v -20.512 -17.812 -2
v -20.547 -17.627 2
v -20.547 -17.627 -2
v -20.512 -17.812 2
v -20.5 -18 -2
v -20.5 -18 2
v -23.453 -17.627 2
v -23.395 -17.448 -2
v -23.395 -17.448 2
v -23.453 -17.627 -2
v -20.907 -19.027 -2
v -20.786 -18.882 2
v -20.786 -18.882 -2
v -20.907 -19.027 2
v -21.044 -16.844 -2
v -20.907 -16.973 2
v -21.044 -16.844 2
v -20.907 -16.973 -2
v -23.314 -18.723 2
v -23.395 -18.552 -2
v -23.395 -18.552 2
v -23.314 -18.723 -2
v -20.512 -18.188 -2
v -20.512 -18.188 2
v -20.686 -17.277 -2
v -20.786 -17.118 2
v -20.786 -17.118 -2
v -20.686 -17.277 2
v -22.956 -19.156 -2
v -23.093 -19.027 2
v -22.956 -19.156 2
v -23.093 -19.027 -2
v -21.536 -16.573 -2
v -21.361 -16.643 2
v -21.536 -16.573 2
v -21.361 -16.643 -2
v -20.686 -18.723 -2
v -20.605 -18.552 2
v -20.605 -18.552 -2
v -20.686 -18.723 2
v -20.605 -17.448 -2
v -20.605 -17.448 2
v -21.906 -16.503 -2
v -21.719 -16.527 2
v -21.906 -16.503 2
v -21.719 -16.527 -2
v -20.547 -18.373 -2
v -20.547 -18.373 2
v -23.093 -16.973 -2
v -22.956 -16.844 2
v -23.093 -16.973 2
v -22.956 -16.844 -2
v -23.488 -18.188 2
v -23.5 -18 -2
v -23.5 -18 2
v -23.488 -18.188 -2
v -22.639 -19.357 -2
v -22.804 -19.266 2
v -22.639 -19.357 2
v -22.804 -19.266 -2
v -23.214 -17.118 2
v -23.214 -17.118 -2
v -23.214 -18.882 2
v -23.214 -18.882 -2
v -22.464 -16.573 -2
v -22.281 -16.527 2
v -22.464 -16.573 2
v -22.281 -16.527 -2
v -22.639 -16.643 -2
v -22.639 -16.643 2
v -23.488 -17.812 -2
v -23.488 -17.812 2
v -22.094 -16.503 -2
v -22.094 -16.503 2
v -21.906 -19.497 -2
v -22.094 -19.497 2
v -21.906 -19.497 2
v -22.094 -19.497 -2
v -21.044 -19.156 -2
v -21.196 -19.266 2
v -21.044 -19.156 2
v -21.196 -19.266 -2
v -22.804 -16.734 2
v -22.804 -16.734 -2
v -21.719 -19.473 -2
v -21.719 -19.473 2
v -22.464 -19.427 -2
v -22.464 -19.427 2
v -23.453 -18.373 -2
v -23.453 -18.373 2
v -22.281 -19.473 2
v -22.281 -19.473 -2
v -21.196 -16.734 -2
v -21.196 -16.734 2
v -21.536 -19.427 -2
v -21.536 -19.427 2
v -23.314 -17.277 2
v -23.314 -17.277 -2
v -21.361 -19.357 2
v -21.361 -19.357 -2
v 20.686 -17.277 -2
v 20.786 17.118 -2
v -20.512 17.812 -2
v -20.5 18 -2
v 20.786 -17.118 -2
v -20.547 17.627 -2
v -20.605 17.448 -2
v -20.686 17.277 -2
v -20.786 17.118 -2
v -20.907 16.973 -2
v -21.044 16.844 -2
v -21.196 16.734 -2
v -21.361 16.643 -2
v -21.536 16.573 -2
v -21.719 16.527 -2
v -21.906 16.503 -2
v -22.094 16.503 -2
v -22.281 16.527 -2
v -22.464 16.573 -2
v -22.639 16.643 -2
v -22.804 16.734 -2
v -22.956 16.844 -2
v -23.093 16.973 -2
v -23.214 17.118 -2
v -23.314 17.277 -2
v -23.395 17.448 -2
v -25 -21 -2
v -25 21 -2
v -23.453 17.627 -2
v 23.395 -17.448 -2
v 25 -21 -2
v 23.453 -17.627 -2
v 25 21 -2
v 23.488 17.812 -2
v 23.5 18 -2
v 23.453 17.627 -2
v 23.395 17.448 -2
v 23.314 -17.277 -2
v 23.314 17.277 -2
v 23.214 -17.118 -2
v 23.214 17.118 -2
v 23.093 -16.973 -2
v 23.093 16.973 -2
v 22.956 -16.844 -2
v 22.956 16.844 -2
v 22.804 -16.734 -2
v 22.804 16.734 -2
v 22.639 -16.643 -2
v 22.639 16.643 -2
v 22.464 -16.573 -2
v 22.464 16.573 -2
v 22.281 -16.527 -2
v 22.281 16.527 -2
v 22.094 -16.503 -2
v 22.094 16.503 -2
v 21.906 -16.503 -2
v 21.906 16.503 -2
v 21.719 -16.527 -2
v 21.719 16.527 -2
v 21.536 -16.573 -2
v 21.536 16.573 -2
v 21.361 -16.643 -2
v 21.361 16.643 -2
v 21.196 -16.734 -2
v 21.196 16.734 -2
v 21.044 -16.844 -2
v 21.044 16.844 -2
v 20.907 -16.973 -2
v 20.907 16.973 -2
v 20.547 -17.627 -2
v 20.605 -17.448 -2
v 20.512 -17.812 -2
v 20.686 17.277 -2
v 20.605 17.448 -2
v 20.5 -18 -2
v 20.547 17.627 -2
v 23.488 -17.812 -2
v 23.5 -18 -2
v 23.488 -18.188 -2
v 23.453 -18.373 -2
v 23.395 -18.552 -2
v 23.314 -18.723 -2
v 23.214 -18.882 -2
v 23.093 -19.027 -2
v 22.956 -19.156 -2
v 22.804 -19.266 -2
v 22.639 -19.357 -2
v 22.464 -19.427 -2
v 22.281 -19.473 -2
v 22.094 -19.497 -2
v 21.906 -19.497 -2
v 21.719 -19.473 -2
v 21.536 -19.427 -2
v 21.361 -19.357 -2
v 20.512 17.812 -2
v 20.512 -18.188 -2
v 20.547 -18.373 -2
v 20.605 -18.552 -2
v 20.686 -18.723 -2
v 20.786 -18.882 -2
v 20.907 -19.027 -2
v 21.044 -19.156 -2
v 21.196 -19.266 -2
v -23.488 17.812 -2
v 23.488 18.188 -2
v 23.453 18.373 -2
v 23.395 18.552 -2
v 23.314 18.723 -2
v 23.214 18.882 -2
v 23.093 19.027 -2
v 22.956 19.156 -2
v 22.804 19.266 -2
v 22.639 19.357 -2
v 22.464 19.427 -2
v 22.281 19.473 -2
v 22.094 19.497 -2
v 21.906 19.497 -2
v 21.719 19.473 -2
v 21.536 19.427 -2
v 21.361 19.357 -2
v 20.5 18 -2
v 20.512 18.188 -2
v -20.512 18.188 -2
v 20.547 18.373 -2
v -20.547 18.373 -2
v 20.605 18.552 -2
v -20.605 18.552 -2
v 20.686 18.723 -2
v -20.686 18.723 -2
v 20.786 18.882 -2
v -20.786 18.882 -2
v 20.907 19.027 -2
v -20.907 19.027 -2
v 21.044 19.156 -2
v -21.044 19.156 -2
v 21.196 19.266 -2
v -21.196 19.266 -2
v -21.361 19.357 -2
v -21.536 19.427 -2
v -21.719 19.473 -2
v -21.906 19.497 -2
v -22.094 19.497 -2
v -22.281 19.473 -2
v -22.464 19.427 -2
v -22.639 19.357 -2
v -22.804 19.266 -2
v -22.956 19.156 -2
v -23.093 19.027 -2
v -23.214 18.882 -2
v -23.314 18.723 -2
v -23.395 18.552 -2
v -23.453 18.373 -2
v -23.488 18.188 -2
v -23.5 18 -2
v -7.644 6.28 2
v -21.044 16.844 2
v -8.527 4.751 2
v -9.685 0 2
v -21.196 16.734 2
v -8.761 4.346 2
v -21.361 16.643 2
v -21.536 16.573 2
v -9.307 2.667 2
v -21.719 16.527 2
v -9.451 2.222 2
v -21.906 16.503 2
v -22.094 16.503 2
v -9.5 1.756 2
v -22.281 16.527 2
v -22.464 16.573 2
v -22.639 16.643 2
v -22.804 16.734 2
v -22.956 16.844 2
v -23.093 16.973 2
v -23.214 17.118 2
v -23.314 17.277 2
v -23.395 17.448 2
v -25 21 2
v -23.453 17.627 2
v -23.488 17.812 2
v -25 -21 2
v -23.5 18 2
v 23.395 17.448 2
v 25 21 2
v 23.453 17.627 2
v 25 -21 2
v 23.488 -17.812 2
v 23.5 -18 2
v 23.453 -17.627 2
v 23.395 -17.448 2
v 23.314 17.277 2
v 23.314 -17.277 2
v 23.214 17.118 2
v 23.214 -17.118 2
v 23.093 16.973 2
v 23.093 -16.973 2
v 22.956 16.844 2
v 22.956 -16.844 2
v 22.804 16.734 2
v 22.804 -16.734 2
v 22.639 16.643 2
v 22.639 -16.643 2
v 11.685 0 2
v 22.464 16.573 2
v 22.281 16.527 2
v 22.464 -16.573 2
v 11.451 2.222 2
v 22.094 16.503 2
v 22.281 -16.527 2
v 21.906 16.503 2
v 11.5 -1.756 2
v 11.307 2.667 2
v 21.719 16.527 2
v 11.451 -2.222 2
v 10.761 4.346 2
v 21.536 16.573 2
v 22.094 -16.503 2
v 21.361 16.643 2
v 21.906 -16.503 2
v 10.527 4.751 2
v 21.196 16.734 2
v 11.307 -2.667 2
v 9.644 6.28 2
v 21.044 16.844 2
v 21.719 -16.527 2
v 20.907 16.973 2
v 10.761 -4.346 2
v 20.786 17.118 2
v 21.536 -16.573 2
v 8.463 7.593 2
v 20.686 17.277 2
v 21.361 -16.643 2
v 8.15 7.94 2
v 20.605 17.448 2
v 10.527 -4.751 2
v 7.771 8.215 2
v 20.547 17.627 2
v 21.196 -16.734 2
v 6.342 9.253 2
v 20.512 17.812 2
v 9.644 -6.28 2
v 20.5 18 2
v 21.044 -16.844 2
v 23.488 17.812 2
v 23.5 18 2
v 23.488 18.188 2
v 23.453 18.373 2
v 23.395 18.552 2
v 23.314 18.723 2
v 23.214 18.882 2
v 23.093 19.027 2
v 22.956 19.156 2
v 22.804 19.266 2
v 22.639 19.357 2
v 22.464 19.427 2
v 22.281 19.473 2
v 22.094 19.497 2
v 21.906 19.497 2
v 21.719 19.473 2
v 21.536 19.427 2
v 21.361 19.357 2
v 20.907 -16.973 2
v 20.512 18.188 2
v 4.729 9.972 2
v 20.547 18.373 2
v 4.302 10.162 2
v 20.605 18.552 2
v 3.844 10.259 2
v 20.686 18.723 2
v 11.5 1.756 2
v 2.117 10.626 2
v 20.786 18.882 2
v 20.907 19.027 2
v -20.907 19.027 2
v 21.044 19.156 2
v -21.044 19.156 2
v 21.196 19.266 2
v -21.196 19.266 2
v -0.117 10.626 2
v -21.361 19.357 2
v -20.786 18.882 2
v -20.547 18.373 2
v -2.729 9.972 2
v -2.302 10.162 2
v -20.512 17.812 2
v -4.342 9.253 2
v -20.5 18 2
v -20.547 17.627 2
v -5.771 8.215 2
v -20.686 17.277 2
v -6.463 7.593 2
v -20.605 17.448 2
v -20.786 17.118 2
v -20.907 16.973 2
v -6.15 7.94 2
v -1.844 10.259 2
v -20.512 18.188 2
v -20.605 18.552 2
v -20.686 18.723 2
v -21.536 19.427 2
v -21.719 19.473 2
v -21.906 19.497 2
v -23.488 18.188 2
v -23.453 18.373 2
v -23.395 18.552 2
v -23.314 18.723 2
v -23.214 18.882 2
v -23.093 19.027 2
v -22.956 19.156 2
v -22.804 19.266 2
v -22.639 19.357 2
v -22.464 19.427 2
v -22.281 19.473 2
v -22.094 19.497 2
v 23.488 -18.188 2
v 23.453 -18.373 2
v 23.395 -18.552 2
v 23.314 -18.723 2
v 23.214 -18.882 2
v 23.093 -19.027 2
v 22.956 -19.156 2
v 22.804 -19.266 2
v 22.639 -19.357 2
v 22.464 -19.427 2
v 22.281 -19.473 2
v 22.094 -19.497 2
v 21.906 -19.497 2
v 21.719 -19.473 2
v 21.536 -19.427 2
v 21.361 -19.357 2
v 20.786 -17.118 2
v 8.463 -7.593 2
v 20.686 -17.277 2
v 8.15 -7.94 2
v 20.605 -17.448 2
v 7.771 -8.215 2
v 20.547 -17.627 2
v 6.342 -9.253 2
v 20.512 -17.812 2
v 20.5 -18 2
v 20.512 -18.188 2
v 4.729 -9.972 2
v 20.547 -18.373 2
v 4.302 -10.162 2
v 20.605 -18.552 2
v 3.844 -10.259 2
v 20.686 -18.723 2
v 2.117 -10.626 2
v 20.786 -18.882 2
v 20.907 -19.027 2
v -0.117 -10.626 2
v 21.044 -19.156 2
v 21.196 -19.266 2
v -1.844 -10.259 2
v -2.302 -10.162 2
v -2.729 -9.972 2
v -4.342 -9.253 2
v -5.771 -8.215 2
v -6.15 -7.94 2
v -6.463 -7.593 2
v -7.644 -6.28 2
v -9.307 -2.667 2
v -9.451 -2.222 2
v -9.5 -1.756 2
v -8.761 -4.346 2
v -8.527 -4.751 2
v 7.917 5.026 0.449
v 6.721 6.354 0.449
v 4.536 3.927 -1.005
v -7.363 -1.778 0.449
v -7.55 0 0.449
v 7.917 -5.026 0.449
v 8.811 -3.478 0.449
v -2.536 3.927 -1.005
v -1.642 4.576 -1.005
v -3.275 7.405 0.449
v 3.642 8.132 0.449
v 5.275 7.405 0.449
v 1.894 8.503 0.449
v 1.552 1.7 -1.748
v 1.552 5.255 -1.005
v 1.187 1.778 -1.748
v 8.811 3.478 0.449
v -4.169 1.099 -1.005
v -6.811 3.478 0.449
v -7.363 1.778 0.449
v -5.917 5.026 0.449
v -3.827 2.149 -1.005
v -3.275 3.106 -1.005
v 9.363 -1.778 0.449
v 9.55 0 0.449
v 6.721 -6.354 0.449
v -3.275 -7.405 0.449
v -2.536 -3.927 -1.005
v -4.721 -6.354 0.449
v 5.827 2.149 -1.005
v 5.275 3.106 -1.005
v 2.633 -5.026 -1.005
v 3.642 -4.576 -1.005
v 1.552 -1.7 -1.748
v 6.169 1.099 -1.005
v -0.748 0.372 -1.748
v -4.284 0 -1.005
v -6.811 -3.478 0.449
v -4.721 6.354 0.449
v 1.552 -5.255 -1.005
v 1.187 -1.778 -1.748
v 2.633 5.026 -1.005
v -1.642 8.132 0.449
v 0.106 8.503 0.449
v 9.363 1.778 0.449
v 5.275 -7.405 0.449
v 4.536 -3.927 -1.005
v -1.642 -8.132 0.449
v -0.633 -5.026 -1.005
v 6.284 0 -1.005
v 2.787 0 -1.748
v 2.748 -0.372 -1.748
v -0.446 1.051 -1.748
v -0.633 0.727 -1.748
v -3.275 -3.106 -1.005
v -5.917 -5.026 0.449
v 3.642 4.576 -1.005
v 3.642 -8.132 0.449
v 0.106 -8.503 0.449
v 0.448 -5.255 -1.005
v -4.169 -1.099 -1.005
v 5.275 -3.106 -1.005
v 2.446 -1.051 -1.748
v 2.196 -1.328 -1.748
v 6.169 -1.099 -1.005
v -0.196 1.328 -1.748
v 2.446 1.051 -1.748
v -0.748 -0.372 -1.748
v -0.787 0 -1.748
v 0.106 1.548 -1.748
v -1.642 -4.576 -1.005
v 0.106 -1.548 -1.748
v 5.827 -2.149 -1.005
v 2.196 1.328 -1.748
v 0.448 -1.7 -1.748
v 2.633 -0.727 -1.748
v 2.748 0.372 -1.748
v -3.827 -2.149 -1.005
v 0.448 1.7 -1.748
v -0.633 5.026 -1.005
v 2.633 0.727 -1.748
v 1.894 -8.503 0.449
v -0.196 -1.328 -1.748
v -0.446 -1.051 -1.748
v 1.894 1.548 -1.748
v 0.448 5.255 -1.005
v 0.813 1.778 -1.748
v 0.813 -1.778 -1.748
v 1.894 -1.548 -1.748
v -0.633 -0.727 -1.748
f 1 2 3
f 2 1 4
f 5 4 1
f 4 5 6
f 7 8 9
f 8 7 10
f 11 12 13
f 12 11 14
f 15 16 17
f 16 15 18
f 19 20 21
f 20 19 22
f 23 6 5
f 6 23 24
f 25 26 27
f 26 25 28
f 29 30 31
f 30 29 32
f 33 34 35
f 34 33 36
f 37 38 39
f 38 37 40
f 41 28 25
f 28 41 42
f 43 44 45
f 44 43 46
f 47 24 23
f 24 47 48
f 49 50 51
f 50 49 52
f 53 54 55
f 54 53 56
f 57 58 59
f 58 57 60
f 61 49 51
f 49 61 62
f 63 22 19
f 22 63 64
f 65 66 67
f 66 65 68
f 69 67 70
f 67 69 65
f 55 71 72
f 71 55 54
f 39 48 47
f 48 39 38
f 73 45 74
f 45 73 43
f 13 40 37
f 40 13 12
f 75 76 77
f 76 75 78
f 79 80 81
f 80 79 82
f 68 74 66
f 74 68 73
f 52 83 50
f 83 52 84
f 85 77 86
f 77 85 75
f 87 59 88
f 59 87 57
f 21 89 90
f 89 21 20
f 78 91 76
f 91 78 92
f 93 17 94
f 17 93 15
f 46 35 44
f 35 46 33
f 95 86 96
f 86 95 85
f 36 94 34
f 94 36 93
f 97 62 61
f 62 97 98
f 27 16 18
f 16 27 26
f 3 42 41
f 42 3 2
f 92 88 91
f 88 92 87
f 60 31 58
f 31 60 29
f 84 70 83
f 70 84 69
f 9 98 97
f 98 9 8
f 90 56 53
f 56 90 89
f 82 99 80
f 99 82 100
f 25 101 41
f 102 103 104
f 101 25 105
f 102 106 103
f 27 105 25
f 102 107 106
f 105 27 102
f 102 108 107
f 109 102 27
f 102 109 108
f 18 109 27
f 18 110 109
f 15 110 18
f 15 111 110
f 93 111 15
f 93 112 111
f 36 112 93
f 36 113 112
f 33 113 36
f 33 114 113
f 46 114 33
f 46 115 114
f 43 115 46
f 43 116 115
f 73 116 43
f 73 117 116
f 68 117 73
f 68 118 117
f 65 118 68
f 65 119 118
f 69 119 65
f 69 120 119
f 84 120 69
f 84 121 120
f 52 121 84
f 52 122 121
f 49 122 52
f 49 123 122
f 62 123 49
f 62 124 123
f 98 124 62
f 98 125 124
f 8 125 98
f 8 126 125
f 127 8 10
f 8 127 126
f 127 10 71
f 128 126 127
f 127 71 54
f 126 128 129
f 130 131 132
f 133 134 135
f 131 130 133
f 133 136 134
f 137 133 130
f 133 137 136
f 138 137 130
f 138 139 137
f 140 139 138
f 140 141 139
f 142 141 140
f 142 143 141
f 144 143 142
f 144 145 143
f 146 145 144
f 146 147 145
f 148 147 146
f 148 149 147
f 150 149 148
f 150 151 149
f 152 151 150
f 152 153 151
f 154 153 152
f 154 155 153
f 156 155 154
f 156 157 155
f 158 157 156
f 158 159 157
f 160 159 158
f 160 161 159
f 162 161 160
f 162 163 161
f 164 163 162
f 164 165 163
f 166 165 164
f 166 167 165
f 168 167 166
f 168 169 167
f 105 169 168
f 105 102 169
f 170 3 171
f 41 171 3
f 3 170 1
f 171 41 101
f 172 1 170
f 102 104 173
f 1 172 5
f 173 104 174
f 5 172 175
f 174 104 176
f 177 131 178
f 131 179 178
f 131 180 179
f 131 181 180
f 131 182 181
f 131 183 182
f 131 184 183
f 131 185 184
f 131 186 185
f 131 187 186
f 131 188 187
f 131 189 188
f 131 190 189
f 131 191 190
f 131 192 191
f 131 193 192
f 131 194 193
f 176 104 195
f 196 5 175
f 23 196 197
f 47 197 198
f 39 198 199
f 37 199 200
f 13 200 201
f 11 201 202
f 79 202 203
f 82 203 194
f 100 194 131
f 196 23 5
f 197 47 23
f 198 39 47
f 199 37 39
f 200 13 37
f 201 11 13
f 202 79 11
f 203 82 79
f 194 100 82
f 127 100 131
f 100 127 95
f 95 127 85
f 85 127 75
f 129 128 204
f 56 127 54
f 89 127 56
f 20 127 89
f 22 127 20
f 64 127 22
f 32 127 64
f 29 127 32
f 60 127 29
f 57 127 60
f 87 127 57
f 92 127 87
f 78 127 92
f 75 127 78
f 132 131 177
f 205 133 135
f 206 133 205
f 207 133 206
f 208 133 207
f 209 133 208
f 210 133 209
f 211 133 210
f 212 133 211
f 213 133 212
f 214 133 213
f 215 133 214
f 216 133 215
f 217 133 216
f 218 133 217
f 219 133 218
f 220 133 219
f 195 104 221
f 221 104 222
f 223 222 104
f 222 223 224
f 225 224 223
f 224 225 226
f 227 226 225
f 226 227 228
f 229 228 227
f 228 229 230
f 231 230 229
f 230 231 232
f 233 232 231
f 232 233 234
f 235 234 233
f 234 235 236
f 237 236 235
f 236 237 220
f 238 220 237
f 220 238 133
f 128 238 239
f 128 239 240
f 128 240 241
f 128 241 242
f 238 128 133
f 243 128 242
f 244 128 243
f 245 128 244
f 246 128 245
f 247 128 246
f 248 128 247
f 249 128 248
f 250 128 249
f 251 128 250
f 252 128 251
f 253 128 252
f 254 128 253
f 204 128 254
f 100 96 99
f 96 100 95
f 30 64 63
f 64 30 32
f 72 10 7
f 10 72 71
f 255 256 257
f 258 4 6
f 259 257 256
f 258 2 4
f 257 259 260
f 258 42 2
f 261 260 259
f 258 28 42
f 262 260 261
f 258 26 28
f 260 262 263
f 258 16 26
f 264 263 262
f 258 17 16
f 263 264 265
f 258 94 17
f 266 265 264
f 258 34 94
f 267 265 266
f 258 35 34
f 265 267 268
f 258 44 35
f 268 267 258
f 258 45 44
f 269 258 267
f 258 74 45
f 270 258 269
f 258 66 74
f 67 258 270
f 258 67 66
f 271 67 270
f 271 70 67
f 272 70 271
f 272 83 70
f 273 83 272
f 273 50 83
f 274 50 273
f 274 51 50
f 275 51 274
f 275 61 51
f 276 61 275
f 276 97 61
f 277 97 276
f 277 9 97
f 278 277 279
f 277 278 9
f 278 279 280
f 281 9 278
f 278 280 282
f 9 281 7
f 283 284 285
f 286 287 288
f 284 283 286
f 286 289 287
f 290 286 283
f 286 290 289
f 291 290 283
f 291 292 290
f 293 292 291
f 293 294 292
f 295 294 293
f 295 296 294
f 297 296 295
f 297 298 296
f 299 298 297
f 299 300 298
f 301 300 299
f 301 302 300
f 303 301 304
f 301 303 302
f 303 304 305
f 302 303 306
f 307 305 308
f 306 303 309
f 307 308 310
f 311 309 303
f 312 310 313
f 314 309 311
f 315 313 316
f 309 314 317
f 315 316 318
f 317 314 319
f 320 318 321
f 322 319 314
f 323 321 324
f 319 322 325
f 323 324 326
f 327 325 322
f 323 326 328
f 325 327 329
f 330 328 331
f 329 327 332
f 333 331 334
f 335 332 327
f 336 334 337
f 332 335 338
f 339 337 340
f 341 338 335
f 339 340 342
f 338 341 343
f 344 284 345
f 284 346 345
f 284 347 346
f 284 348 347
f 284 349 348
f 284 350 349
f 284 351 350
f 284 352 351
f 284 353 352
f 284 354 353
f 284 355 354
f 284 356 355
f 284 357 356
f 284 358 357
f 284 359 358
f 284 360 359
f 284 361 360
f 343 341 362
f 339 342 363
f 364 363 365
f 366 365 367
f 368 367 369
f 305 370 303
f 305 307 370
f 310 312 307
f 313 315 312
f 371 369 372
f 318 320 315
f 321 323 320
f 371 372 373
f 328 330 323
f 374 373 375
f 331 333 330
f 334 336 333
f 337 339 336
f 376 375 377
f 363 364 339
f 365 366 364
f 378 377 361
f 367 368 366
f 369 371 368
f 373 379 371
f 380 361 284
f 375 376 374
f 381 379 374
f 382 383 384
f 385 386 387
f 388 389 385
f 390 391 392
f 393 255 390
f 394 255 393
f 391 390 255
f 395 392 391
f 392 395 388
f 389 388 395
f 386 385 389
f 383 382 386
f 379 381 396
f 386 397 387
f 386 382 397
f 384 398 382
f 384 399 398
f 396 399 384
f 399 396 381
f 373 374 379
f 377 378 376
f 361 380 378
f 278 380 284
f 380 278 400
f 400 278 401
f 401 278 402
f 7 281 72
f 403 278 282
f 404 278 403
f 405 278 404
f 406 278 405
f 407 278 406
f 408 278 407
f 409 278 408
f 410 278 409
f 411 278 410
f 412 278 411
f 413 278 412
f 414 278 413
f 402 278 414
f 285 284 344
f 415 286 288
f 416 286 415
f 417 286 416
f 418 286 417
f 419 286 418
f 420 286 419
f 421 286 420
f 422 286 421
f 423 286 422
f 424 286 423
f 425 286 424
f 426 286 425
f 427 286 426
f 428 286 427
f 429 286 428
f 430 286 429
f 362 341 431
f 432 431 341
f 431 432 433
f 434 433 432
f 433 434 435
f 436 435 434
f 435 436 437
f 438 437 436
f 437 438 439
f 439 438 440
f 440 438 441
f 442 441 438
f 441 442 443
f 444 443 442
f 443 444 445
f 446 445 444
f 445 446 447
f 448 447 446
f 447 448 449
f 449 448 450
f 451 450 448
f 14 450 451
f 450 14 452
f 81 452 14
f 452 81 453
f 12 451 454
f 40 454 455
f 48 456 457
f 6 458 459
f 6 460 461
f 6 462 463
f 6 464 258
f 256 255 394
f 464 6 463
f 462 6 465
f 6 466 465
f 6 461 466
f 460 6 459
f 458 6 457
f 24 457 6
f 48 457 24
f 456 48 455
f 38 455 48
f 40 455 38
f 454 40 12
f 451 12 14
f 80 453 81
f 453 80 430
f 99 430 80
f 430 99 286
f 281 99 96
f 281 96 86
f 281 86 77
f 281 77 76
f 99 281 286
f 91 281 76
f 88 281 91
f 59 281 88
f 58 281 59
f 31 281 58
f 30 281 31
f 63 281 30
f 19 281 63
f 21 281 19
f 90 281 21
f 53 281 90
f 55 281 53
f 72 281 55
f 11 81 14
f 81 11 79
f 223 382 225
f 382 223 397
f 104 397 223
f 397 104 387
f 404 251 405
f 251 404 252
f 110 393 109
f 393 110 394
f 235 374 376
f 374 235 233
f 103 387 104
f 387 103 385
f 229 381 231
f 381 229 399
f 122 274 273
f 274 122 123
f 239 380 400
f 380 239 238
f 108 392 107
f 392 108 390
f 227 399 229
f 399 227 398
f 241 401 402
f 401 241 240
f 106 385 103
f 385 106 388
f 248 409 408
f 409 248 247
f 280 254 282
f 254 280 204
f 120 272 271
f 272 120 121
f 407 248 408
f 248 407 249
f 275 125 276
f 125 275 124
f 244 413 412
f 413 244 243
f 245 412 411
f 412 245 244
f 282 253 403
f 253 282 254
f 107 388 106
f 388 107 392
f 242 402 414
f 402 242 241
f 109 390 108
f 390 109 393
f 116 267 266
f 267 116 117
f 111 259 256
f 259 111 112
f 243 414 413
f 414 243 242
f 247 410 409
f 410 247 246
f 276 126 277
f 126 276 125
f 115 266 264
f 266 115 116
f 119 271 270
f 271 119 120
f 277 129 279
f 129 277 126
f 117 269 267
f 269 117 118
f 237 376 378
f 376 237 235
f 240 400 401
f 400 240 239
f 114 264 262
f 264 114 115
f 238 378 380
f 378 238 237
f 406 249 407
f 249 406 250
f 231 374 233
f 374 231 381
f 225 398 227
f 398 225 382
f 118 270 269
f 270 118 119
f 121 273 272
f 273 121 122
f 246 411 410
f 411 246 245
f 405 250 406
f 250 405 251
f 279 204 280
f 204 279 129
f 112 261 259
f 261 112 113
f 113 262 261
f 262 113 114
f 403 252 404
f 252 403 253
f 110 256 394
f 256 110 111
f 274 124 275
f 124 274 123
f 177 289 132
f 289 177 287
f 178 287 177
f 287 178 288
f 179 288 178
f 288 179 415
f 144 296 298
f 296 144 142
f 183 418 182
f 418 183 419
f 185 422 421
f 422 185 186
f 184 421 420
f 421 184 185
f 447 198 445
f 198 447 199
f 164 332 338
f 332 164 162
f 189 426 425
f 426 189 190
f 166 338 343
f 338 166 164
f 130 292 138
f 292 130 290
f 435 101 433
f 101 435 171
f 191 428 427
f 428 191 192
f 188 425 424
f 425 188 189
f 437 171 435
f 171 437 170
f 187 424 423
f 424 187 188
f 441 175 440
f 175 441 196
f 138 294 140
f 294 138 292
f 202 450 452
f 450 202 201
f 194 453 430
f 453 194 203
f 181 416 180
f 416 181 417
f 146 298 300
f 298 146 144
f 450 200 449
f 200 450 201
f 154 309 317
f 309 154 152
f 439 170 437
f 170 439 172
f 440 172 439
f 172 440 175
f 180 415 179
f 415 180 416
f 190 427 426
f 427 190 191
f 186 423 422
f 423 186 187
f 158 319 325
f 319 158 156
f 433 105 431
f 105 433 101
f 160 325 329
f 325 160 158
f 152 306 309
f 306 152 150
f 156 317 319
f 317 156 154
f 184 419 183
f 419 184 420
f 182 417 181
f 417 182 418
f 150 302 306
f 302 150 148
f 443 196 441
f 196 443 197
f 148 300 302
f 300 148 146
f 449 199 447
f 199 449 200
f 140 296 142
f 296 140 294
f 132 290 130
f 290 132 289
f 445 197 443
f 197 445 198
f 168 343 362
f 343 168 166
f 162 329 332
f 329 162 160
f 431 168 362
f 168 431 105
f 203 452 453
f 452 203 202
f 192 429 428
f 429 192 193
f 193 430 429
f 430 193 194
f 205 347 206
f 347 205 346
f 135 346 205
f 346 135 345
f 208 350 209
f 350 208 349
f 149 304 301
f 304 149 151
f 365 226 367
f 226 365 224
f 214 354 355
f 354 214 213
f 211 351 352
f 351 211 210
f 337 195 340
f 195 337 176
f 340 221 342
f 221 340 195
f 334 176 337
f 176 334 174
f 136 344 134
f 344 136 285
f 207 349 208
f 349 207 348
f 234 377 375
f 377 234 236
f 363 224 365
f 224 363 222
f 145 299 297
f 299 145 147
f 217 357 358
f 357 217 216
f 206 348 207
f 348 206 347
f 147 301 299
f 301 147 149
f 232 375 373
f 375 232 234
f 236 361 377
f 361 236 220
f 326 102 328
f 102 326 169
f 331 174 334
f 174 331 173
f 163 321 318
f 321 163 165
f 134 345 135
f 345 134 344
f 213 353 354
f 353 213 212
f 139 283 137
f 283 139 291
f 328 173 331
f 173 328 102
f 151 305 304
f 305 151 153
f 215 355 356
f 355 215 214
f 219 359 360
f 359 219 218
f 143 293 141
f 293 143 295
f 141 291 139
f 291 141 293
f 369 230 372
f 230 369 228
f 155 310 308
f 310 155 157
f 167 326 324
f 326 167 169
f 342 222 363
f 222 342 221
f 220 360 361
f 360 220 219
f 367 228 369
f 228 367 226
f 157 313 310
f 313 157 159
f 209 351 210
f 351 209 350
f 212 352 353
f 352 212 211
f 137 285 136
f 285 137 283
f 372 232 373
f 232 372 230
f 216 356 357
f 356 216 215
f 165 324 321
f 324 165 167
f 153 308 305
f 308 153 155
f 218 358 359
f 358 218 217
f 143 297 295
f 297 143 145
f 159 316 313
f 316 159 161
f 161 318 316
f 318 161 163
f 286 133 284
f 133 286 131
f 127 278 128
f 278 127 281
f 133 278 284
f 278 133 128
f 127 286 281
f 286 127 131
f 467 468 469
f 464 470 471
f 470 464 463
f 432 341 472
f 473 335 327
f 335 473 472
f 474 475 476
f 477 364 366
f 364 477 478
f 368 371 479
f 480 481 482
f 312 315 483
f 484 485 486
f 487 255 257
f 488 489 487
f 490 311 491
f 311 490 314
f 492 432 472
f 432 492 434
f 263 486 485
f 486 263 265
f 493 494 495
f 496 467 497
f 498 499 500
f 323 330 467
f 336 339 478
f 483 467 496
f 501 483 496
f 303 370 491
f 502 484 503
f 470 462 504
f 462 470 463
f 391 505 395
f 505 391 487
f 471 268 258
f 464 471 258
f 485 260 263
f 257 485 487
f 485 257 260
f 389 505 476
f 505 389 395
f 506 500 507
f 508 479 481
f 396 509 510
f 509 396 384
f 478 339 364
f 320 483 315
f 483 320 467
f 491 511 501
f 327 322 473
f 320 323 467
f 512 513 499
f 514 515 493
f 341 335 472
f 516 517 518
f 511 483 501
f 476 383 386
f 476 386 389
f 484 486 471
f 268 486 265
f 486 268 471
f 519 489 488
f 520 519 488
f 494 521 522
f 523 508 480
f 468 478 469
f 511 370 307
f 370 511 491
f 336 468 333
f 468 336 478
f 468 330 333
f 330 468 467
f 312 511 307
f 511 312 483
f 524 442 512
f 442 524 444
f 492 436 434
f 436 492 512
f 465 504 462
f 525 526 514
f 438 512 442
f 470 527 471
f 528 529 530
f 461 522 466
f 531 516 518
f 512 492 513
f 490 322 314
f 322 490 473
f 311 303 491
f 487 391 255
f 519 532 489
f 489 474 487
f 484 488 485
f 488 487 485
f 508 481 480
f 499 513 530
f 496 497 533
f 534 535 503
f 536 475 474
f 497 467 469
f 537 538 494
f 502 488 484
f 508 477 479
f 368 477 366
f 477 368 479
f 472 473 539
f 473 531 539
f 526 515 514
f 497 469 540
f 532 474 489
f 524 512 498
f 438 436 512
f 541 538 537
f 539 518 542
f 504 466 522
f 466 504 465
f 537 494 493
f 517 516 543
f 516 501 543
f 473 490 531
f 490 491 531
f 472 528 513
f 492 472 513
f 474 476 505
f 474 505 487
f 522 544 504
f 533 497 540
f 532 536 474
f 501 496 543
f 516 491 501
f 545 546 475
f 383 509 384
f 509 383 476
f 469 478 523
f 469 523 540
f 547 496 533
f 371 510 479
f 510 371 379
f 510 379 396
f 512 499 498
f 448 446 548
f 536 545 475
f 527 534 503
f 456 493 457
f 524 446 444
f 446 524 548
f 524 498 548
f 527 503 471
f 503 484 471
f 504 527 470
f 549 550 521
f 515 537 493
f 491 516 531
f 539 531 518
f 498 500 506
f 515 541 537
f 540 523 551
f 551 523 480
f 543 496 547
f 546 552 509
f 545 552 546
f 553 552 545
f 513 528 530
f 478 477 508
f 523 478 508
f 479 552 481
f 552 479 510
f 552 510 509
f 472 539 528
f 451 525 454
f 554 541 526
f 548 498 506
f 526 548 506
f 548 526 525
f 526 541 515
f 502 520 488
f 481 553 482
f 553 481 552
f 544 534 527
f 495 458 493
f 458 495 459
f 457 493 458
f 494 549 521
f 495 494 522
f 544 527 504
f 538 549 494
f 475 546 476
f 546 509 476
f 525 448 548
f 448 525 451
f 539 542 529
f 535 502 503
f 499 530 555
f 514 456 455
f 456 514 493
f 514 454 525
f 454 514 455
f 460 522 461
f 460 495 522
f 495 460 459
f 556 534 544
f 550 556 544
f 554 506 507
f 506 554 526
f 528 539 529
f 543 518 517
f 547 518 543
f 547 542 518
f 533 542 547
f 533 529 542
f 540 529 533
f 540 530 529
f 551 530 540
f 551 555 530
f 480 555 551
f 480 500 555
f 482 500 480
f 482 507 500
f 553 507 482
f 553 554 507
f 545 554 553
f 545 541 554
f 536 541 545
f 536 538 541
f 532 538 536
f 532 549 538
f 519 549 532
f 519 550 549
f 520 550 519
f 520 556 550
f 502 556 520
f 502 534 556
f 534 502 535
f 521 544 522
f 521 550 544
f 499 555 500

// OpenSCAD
// file: ball_const.scad
$cover_size = [50, 42, 4];
$hole_pos = [1, 0, 0];
$ball_size = 17;
$ball_clearance = 1;
$bearing_in_r  = 1.5;
$bearing_out_r = 3.5;
$bearing_clearance = 0.7;
$bearing_excursion = 4.2;
$bearing_spread_r = 18;
$shaft_length = 8;
$pillar_size = [6, 6, 11];
$screw_hole_r = 1.5;
$ball_cover_t = 1.5;
$ball_cover_clearance = 0.1;
$base_t = 4;

// computed value
$bearing_out_d = $bearing_out_r * 2;
$bearing_in_d = $bearing_in_r * 2;

$ball_z = sqrt(pow($ball_size+$ball_clearance+$bearing_out_r, 2)-pow($bearing_spread_r,2));
module v_holes(h) {
	$screw_xs = [-$cover_size[0]/2+$pillar_size[0]/2, $cover_size[0]/2-$pillar_size[0]/2];
	$screw_ys = [-$cover_size[1]/2+$pillar_size[1]/2, $cover_size[1]/2-$pillar_size[1]/2];
	union() {
		for (i = [0:1]) {
			for (j = [0:1]) {
				translate([$screw_xs[i], $screw_ys[j], 0])
					cylinder(r=$screw_hole_r, h=h, $fn=50);
			}
		}
	}
}
// main file
include <ball_const.scad>

module core() {
	difference() {
		cube([$cover_size[0], $cover_size[1], $base_t], center=true);
		translate([$hole_pos[0], $hole_pos[1], $base_t/2 + $bearing_in_r + $ball_z])
			sphere(r=($ball_size+$ball_cover_clearance), fn=100);
		translate([0, 0, -$base_t/2])
			v_holes($base_t);
	}
}

core();
